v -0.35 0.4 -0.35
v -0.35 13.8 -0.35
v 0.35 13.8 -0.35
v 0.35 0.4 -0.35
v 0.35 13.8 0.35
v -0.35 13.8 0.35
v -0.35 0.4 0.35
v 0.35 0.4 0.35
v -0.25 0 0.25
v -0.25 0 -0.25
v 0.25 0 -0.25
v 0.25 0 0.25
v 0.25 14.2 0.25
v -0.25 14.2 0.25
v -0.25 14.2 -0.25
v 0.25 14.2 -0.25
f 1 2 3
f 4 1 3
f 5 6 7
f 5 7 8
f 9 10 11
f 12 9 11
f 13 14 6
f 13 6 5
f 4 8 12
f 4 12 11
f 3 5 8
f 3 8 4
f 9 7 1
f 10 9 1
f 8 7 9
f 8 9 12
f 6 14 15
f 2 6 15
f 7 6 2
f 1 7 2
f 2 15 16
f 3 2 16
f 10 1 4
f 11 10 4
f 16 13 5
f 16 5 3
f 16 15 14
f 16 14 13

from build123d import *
from OCP.BRepFilletAPI import BRepFilletAPI_MakeChamfer

# Parameters (mm, degrees)
SKETCH_1_W      = 0.7
SKETCH_1_H      = 0.7
EXTRUDE_1_DEPTH = 14.2
CHAMFER_1_SIZE  = 0.4
CHAMFER_1_SIZE2 = 0.1
CHAMFER_2_SIZE  = 0.1
CHAMFER_2_SIZE2 = 0.4


with BuildPart() as part:
    # Эскиз1 → Бобышка-Вытянуть1 (new body)
    with BuildSketch(Plane(origin=(0, 0, 0), x_dir=(1, 0, 0), z_dir=(0, 1, 0))):
        Rectangle(SKETCH_1_W, SKETCH_1_H)
    extrude(amount=EXTRUDE_1_DEPTH)

    # Фаска1: one chamfer whose edges measure the first distance from different faces: ONE call of the kernel's chamfer builder (chamfer() names one face for all edges)
    chamfer_1_edges_1 = [part.edges().sort_by_distance(p)[0] for p in [
        (0.35, 14.2, 0),
    ]]
    chamfer_1_side_1 = [part.faces().sort_by_distance(p)[0] for p in [
        (0.35, 7.1, 0),
    ]]
    chamfer_1_edges_2 = [part.edges().sort_by_distance(p)[0] for p in [
        (0, 14.2, -0.35),
    ]]
    chamfer_1_side_2 = [part.faces().sort_by_distance(p)[0] for p in [
        (0, 7.1, -0.35),
    ]]
    chamfer_1_edges_3 = [part.edges().sort_by_distance(p)[0] for p in [
        (-0.35, 14.2, 0),
    ]]
    chamfer_1_side_3 = [part.faces().sort_by_distance(p)[0] for p in [
        (-0.35, 7.1, 0),
    ]]
    chamfer_1_edges_4 = [part.edges().sort_by_distance(p)[0] for p in [
        (0, 14.2, 0.35),
    ]]
    chamfer_1_side_4 = [part.faces().sort_by_distance(p)[0] for p in [
        (0, 7.1, 0.35),
    ]]
    chamfer_1 = BRepFilletAPI_MakeChamfer(part.part.solid().wrapped)
    for e in chamfer_1_edges_1:
        chamfer_1.Add(CHAMFER_1_SIZE, CHAMFER_1_SIZE2, e.wrapped, chamfer_1_side_1[0].wrapped)  # the first distance lies on this face
    for e in chamfer_1_edges_2:
        chamfer_1.Add(CHAMFER_1_SIZE, CHAMFER_1_SIZE2, e.wrapped, chamfer_1_side_2[0].wrapped)  # the first distance lies on this face
    for e in chamfer_1_edges_3:
        chamfer_1.Add(CHAMFER_1_SIZE, CHAMFER_1_SIZE2, e.wrapped, chamfer_1_side_3[0].wrapped)  # the first distance lies on this face
    for e in chamfer_1_edges_4:
        chamfer_1.Add(CHAMFER_1_SIZE, CHAMFER_1_SIZE2, e.wrapped, chamfer_1_side_4[0].wrapped)  # the first distance lies on this face
    add(Compound.cast(chamfer_1.Shape()), mode=Mode.REPLACE)

    # Фаска2
    chamfer_2_edges = [part.edges().sort_by_distance(p)[0] for p in [
        (0, 0, -0.35),
        (0.35, 0, 0),
        (0, 0, 0.35),
        (-0.35, 0, 0),
    ]]
    chamfer_2_side = [part.faces().sort_by_distance(p)[0] for p in [
        (0, 0, 0),
    ]]
    chamfer(chamfer_2_edges, length=CHAMFER_2_SIZE, length2=CHAMFER_2_SIZE2, reference=chamfer_2_side[0])


solid = part.part
